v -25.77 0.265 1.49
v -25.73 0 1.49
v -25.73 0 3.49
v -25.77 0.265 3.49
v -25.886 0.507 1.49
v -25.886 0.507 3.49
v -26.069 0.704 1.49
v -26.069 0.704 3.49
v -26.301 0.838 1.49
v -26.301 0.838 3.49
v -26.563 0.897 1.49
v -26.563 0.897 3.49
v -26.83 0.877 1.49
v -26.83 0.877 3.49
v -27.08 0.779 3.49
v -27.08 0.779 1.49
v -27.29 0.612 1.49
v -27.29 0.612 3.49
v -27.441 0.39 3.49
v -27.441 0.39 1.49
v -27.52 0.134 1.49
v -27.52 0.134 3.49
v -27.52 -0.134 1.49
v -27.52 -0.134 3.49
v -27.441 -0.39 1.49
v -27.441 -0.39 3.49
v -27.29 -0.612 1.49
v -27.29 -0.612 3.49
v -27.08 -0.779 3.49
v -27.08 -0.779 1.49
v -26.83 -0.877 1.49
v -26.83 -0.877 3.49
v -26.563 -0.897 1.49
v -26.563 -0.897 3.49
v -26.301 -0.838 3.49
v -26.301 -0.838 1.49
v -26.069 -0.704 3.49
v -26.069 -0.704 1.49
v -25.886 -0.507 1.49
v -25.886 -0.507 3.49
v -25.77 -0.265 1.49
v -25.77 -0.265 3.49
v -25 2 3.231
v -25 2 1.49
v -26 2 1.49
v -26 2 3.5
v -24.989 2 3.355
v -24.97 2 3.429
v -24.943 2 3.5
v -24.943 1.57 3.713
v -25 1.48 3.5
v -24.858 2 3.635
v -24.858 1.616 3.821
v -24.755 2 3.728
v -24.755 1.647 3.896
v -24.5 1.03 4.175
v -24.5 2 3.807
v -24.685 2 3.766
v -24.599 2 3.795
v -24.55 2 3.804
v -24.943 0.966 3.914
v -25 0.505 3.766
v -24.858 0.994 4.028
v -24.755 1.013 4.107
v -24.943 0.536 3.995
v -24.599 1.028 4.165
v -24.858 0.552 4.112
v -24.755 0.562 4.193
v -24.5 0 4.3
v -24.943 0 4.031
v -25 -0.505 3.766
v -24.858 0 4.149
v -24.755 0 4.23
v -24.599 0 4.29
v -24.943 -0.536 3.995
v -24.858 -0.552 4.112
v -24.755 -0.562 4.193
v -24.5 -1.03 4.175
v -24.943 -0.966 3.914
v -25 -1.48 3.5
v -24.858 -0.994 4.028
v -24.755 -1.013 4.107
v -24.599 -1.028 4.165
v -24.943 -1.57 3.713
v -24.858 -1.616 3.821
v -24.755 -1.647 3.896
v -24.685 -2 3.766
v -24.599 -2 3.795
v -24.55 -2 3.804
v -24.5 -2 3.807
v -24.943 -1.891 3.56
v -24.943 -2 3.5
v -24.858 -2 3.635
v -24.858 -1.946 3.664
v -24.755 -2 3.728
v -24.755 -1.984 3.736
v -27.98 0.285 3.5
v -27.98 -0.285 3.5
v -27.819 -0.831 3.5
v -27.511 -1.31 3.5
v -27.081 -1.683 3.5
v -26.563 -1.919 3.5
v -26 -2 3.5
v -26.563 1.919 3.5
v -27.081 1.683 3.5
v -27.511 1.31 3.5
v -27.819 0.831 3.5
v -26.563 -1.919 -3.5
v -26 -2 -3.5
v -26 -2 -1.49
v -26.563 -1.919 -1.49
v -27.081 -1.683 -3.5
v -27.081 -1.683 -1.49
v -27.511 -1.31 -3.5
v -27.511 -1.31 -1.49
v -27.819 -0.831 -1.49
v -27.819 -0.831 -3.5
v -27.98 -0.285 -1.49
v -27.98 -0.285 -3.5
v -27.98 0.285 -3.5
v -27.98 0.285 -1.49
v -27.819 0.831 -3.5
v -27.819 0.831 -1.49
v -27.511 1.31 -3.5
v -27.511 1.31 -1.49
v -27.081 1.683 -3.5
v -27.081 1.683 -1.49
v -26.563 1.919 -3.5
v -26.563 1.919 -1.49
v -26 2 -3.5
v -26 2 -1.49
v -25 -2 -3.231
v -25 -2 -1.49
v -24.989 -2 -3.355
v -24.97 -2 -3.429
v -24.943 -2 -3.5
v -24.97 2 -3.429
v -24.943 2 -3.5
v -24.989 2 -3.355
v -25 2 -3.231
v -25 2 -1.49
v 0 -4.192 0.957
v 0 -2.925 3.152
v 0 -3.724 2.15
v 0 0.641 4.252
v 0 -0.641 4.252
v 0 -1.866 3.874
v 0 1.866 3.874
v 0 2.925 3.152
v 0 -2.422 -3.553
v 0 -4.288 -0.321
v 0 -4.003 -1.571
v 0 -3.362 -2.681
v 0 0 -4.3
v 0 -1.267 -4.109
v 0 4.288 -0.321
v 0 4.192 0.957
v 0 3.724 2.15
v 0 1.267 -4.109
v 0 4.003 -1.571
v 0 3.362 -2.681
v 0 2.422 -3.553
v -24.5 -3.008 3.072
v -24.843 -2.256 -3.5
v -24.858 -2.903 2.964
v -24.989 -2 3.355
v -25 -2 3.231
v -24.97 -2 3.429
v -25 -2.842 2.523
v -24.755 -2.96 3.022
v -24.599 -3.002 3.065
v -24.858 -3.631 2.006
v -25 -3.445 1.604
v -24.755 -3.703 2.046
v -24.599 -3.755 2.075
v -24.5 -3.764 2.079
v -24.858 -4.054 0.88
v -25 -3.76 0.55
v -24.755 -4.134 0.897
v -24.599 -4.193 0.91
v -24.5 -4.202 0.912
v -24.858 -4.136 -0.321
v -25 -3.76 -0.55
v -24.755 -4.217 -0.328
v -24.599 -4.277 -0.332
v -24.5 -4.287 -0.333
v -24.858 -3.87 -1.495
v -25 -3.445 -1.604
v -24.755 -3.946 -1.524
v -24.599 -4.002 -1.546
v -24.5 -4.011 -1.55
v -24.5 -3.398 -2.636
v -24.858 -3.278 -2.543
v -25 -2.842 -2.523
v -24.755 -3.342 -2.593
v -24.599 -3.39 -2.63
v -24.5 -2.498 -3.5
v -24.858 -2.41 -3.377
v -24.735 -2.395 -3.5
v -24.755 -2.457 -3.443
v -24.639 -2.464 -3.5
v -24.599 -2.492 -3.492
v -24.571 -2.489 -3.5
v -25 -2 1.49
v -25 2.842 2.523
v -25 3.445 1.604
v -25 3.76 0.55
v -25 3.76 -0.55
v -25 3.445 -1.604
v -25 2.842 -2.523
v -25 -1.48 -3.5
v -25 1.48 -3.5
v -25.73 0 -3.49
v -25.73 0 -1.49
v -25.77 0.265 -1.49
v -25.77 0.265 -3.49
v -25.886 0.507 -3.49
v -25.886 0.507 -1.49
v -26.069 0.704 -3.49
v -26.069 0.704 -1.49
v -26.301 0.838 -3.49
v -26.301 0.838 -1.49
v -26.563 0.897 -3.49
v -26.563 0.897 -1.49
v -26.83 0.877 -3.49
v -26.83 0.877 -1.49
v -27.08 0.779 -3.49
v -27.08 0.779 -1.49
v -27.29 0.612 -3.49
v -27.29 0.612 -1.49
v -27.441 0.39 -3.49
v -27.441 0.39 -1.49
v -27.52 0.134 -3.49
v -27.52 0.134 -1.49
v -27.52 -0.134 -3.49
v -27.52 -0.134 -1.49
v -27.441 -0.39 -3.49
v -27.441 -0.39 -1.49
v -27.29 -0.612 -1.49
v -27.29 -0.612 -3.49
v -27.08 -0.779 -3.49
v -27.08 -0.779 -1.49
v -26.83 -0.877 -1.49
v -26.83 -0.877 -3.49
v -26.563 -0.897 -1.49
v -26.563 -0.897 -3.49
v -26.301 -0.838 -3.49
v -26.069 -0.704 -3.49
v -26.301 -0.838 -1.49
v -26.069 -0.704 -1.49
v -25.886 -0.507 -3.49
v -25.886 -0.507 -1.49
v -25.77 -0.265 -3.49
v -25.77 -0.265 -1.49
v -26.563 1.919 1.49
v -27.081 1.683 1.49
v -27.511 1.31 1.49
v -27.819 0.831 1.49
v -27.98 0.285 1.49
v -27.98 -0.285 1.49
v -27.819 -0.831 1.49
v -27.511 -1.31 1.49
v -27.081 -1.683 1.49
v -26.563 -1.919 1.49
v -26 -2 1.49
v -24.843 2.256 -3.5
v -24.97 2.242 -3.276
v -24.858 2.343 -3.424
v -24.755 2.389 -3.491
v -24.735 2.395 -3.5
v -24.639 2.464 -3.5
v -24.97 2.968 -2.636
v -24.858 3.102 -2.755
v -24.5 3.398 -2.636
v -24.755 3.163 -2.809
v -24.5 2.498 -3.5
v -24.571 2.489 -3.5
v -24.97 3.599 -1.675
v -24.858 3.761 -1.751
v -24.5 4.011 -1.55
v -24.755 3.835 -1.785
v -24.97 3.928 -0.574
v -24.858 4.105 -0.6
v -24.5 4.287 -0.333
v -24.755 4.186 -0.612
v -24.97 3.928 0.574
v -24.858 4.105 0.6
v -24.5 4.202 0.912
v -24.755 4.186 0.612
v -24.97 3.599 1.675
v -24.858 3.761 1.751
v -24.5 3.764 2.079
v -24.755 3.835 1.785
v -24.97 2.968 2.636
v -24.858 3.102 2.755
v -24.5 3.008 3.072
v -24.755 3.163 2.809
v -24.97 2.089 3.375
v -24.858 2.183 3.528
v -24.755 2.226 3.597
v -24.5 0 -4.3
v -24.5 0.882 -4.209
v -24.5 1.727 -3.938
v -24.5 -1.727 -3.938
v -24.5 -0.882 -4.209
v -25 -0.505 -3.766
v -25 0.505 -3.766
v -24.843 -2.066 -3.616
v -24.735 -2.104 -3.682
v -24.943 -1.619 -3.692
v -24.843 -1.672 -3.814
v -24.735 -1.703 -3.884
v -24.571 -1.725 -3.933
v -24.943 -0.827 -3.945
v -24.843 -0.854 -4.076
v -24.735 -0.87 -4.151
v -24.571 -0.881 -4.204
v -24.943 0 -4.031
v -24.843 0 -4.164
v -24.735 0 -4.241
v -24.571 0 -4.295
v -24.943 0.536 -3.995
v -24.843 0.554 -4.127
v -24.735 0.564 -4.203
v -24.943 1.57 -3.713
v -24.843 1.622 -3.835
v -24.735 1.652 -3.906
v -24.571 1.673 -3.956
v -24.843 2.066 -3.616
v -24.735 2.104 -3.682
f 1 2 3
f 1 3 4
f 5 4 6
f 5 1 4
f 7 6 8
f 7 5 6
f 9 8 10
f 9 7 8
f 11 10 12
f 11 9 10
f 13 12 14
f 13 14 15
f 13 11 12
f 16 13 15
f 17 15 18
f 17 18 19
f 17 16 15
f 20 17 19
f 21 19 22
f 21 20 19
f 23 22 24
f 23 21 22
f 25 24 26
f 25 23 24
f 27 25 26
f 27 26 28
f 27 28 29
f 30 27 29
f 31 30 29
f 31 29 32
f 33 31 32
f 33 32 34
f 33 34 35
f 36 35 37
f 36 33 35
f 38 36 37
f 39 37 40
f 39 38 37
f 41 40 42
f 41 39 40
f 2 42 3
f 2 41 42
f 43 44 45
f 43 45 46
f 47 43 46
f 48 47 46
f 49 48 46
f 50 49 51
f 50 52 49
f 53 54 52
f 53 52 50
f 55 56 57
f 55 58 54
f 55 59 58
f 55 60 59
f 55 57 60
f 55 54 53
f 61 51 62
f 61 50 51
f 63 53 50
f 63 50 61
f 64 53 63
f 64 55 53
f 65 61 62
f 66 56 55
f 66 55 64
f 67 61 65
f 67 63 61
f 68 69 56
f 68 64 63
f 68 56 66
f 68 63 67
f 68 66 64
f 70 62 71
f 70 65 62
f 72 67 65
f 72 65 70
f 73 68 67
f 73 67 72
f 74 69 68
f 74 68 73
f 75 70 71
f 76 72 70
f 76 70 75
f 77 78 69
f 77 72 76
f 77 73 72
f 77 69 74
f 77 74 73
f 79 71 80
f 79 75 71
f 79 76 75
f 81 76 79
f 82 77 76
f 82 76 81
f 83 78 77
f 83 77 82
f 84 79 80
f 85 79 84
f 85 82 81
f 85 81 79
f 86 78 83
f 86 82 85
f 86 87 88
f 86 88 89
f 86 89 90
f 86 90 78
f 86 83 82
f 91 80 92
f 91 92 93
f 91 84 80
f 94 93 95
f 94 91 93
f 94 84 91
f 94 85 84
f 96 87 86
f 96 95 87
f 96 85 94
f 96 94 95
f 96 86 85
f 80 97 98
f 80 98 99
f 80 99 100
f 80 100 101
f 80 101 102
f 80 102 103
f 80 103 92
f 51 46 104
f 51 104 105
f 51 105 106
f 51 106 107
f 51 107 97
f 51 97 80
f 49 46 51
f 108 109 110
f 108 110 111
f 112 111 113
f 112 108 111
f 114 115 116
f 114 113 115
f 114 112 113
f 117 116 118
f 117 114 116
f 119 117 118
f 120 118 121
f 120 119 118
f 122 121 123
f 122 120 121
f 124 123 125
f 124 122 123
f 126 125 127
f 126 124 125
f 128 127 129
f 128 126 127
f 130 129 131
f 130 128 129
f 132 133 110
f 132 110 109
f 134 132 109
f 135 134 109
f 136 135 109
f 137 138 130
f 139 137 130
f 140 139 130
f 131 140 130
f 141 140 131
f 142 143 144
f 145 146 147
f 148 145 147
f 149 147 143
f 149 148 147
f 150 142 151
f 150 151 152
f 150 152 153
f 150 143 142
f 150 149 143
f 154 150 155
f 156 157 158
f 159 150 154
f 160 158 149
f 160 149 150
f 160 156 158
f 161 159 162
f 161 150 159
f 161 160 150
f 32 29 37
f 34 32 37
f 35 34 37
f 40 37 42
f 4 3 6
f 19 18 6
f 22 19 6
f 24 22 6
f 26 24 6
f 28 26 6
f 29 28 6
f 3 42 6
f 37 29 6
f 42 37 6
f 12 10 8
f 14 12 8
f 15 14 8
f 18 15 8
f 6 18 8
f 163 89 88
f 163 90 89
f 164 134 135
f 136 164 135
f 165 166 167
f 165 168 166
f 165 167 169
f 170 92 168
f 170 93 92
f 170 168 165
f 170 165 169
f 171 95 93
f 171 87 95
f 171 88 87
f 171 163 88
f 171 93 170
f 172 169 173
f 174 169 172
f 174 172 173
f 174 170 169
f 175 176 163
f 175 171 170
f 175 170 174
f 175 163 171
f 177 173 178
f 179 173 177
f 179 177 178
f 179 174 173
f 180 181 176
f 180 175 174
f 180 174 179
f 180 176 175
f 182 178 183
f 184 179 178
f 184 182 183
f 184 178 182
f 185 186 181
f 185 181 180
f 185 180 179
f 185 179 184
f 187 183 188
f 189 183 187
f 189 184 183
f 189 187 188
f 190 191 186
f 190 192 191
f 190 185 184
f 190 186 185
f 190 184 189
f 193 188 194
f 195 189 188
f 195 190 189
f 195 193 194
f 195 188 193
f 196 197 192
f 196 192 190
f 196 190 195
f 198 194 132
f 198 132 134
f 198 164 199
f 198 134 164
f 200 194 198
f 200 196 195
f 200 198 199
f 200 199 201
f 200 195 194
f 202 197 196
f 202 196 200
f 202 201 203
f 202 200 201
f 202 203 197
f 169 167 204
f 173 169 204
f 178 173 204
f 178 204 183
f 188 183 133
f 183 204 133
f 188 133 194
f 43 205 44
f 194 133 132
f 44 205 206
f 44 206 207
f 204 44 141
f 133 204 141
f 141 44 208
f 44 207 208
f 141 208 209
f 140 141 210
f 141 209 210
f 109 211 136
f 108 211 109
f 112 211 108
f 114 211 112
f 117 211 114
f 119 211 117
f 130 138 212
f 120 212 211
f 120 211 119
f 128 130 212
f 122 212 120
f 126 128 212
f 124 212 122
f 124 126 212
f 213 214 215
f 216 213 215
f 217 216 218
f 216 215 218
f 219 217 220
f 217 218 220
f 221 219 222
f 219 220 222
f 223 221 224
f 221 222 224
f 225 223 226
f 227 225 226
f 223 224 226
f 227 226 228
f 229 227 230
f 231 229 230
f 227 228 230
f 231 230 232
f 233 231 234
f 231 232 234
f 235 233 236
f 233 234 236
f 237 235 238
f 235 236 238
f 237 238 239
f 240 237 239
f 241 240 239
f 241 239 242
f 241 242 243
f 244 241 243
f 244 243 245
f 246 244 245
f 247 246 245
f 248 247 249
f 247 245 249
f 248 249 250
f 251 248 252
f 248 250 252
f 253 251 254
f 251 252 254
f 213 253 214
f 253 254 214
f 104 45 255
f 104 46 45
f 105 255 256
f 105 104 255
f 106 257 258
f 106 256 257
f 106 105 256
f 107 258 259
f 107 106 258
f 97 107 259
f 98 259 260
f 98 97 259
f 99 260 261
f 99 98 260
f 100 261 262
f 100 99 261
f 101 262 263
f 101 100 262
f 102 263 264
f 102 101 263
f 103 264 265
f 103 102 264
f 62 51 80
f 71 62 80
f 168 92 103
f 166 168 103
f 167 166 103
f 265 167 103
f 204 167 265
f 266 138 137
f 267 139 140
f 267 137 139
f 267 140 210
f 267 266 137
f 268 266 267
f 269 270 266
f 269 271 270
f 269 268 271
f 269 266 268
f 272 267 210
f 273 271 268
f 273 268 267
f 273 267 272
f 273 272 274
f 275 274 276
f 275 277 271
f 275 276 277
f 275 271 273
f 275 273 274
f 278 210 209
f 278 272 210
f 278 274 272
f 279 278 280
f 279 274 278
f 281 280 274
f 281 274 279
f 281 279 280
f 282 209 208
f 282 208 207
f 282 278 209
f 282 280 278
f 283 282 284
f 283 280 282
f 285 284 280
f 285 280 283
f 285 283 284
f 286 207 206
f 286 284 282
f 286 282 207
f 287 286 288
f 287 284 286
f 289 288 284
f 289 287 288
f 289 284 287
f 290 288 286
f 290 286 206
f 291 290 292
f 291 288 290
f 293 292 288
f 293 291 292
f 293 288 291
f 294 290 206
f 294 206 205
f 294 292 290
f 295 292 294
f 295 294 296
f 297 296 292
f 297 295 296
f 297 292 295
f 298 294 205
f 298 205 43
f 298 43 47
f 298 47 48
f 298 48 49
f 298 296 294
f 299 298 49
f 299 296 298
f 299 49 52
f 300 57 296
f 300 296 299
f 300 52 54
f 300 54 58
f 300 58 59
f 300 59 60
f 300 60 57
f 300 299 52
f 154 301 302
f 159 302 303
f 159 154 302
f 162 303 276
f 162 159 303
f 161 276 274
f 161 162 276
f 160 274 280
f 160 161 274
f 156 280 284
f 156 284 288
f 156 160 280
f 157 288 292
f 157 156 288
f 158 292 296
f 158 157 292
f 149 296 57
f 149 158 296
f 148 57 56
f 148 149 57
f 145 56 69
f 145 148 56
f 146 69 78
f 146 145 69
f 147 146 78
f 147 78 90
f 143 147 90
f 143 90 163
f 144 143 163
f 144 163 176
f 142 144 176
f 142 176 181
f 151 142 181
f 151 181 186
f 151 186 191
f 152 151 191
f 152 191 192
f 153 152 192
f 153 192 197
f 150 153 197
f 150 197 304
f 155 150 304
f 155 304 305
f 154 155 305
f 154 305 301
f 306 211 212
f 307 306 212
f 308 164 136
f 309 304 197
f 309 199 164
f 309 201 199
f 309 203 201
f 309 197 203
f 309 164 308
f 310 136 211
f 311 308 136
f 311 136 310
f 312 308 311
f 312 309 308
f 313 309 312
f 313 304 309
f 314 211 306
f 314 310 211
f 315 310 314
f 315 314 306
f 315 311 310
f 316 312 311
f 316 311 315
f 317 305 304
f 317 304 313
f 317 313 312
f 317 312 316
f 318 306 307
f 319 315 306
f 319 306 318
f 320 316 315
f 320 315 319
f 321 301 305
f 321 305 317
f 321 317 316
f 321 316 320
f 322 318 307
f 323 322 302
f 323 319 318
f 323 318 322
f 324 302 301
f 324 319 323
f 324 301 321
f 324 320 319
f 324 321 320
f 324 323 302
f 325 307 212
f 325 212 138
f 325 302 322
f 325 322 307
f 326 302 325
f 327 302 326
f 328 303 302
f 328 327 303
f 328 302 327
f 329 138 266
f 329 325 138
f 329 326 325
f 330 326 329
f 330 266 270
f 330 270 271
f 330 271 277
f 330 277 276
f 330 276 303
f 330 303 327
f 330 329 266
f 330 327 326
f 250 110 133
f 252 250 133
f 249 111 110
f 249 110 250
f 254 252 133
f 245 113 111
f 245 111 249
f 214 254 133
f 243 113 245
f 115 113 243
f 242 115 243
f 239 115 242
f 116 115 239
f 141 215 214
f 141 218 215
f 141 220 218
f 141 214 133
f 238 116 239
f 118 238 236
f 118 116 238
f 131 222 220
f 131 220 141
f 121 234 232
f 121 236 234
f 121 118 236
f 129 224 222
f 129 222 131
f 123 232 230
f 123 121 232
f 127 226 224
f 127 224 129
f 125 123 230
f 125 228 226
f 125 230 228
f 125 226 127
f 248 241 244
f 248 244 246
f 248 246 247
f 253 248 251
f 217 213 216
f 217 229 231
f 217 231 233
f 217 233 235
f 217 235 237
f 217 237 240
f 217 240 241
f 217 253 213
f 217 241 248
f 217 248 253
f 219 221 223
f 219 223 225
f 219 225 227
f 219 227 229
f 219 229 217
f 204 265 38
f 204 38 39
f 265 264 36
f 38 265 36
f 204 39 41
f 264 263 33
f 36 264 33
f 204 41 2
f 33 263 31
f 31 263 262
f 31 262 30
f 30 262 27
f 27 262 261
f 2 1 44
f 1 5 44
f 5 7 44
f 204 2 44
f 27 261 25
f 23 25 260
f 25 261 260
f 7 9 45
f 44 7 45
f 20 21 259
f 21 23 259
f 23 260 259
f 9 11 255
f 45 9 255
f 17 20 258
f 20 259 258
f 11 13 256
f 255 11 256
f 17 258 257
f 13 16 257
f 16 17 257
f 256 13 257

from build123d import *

# Parameters (mm, degrees)
ESBO_O4_R                = 4.3
RESSALTO_EXTRUS_O1_DEPTH = 25
ESBO_O5_W                = 7
ESBO_O5_H                = 4
RESSALTO_EXTRUS_O4_DEPTH = 3
ESBO_O7_W                = 2.98
ESBO_O7_H                = 4
CORTE_EXTRUS_O2_DEPTH    = 3
ESBO_O8_R                = 0.9
CORTE_EXTRUS_O3_DEPTH    = 2
FILETE2_RADIUS           = 2
FILETE2_LENGTH           = 2.01
FILETE3_RADIUS           = 2
FILETE3_LENGTH           = 2.01
FILETE4_R                = 0.5


with BuildPart() as part:
    # Esboço4 → Ressalto-extrusão1 (new body)
    with BuildSketch(Plane(origin=(0, 0, 0), x_dir=(0, 0, -1), z_dir=(1, 0, 0))):
        Circle(ESBO_O4_R)
    extrude(amount=-RESSALTO_EXTRUS_O1_DEPTH)

    # Esboço5 → Ressalto-extrusão4 (add)
    with BuildSketch(Plane.ZY.offset(25)):
        Rectangle(ESBO_O5_W, ESBO_O5_H)
    extrude(amount=RESSALTO_EXTRUS_O4_DEPTH)

    # Esboço7 → Corte-extrusão2 (cut)
    with BuildSketch(Plane.ZY.offset(28)):
        Rectangle(ESBO_O7_W, ESBO_O7_H)
    extrude(amount=-CORTE_EXTRUS_O2_DEPTH, mode=Mode.SUBTRACT)

    # Esboço8 → Corte-extrusão3 (cut)
    with BuildSketch(Plane.XY.offset(-1.49)):
        with Locations((-26.63, 0)):
            Circle(ESBO_O8_R)
    corte_extrus_o3 = extrude(amount=-CORTE_EXTRUS_O3_DEPTH, mode=Mode.SUBTRACT)

    # Filete2: full round fillet: the end face becomes a half cylinder, R = half its width
    filete2_face = Plane((-28, 0, -2.495), x_dir=(0, 0, -1), z_dir=(-1, 0, 0))  # on the end face: x along it, z out of the body
    filete2_slab = filete2_face.offset(-FILETE2_RADIUS / 2) * Box(FILETE2_LENGTH, 2 * FILETE2_RADIUS, FILETE2_RADIUS, mode=Mode.PRIVATE)  # the body's end, R deep
    filete2_round = Plane((-26, 0, -2.495), x_dir=(-1, 0, 0), z_dir=(0, 0, -1)) * Cylinder(FILETE2_RADIUS, FILETE2_LENGTH, mode=Mode.PRIVATE)  # its axis R under the face
    add(filete2_slab - filete2_round, mode=Mode.SUBTRACT)

    # Espelhar7: Corte-extrusão3 across plane
    add(corte_extrus_o3.mirror(Plane.XY), mode=Mode.SUBTRACT)

    # Filete3: full round fillet: the end face becomes a half cylinder, R = half its width
    filete3_face = Plane((-28, 0, 2.495), x_dir=(0, 0, 1), z_dir=(-1, 0, 0))  # on the end face: x along it, z out of the body
    filete3_slab = filete3_face.offset(-FILETE3_RADIUS / 2) * Box(FILETE3_LENGTH, 2 * FILETE3_RADIUS, FILETE3_RADIUS, mode=Mode.PRIVATE)  # the body's end, R deep
    filete3_round = Plane((-26, 0, 2.495), x_dir=(-1, 0, 0), z_dir=(0, 0, 1)) * Cylinder(FILETE3_RADIUS, FILETE3_LENGTH, mode=Mode.PRIVATE)  # its axis R under the face
    add(filete3_slab - filete3_round, mode=Mode.SUBTRACT)

    # Filete4
    # the kernel refuses this fillet: 0.5 mm, written as the material it takes off along each edge
    with BuildSketch(Plane(origin=(-25, 0, 0), x_dir=(0, 0, -1), z_dir=(0, -1, 0))) as filete4_piece_1_section:
        with BuildLine():
            CenterArc((4.3 - FILETE4_R, FILETE4_R), FILETE4_R, 270, 90)
            Line((4.3 - FILETE4_R, 0), (4.3, 0))
            Line((4.3, 0), (4.3, FILETE4_R))
        make_face()
    filete4_piece_1 = revolve(axis=Axis((-25, 0, 0), (1, 0, 0)), mode=Mode.PRIVATE)
    filete4_piece_1 = split(filete4_piece_1, bisect_by=Plane(origin=(-24.857838708, 1.067183876, -3.5), z_dir=(0, 0, -1)), keep=Keep.TOP, mode=Mode.PRIVATE)
    add(filete4_piece_1, mode=Mode.SUBTRACT)
    with BuildSketch(Plane(origin=(-25, 0, 0), x_dir=(0, 0, -1), z_dir=(0, -1, 0))) as filete4_piece_2_section:
        with BuildLine():
            CenterArc((4.3 - FILETE4_R, FILETE4_R), FILETE4_R, 270, 90)
            Line((4.3 - FILETE4_R, 0), (4.3, 0))
            Line((4.3, 0), (4.3, FILETE4_R))
        make_face()
    filete4_piece_2 = revolve(axis=Axis((-25, 0, 0), (1, 0, 0)), mode=Mode.PRIVATE)
    filete4_piece_2 = split(filete4_piece_2, bisect_by=Plane(origin=(-24.858947412, 2, 0), z_dir=(0, 1, 0)), keep=Keep.TOP, mode=Mode.PRIVATE)
    add(filete4_piece_2, mode=Mode.SUBTRACT)
    with BuildSketch(Plane(origin=(-25, 0, 0), x_dir=(0, 0, -1), z_dir=(0, -1, 0))) as filete4_piece_3_section:
        with BuildLine():
            CenterArc((4.3 - FILETE4_R, FILETE4_R), FILETE4_R, 270, 90)
            Line((4.3 - FILETE4_R, 0), (4.3, 0))
            Line((4.3, 0), (4.3, FILETE4_R))
        make_face()
    filete4_piece_3 = revolve(axis=Axis((-25, 0, 0), (1, 0, 0)), mode=Mode.PRIVATE)
    filete4_piece_3 = split(filete4_piece_3, bisect_by=Plane(origin=(-24.858947412, -2, 0), z_dir=(0, -1, 0)), keep=Keep.TOP, mode=Mode.PRIVATE)
    add(filete4_piece_3, mode=Mode.SUBTRACT)
    with BuildSketch(Plane(origin=(-25, 0, 0), x_dir=(0, 0, -1), z_dir=(0, -1, 0))) as filete4_piece_4_section:
        with BuildLine():
            CenterArc((4.3 - FILETE4_R, FILETE4_R), FILETE4_R, 270, 90)
            Line((4.3 - FILETE4_R, 0), (4.3, 0))
            Line((4.3, 0), (4.3, FILETE4_R))
        make_face()
    filete4_piece_4 = revolve(axis=Axis((-25, 0, 0), (1, 0, 0)), mode=Mode.PRIVATE)
    filete4_piece_4 = split(filete4_piece_4, bisect_by=Plane(origin=(-24.85783871, 0, 3.5), z_dir=(0, 0, 1)), keep=Keep.TOP, mode=Mode.PRIVATE)
    add(filete4_piece_4, mode=Mode.SUBTRACT)


solid = part.part
